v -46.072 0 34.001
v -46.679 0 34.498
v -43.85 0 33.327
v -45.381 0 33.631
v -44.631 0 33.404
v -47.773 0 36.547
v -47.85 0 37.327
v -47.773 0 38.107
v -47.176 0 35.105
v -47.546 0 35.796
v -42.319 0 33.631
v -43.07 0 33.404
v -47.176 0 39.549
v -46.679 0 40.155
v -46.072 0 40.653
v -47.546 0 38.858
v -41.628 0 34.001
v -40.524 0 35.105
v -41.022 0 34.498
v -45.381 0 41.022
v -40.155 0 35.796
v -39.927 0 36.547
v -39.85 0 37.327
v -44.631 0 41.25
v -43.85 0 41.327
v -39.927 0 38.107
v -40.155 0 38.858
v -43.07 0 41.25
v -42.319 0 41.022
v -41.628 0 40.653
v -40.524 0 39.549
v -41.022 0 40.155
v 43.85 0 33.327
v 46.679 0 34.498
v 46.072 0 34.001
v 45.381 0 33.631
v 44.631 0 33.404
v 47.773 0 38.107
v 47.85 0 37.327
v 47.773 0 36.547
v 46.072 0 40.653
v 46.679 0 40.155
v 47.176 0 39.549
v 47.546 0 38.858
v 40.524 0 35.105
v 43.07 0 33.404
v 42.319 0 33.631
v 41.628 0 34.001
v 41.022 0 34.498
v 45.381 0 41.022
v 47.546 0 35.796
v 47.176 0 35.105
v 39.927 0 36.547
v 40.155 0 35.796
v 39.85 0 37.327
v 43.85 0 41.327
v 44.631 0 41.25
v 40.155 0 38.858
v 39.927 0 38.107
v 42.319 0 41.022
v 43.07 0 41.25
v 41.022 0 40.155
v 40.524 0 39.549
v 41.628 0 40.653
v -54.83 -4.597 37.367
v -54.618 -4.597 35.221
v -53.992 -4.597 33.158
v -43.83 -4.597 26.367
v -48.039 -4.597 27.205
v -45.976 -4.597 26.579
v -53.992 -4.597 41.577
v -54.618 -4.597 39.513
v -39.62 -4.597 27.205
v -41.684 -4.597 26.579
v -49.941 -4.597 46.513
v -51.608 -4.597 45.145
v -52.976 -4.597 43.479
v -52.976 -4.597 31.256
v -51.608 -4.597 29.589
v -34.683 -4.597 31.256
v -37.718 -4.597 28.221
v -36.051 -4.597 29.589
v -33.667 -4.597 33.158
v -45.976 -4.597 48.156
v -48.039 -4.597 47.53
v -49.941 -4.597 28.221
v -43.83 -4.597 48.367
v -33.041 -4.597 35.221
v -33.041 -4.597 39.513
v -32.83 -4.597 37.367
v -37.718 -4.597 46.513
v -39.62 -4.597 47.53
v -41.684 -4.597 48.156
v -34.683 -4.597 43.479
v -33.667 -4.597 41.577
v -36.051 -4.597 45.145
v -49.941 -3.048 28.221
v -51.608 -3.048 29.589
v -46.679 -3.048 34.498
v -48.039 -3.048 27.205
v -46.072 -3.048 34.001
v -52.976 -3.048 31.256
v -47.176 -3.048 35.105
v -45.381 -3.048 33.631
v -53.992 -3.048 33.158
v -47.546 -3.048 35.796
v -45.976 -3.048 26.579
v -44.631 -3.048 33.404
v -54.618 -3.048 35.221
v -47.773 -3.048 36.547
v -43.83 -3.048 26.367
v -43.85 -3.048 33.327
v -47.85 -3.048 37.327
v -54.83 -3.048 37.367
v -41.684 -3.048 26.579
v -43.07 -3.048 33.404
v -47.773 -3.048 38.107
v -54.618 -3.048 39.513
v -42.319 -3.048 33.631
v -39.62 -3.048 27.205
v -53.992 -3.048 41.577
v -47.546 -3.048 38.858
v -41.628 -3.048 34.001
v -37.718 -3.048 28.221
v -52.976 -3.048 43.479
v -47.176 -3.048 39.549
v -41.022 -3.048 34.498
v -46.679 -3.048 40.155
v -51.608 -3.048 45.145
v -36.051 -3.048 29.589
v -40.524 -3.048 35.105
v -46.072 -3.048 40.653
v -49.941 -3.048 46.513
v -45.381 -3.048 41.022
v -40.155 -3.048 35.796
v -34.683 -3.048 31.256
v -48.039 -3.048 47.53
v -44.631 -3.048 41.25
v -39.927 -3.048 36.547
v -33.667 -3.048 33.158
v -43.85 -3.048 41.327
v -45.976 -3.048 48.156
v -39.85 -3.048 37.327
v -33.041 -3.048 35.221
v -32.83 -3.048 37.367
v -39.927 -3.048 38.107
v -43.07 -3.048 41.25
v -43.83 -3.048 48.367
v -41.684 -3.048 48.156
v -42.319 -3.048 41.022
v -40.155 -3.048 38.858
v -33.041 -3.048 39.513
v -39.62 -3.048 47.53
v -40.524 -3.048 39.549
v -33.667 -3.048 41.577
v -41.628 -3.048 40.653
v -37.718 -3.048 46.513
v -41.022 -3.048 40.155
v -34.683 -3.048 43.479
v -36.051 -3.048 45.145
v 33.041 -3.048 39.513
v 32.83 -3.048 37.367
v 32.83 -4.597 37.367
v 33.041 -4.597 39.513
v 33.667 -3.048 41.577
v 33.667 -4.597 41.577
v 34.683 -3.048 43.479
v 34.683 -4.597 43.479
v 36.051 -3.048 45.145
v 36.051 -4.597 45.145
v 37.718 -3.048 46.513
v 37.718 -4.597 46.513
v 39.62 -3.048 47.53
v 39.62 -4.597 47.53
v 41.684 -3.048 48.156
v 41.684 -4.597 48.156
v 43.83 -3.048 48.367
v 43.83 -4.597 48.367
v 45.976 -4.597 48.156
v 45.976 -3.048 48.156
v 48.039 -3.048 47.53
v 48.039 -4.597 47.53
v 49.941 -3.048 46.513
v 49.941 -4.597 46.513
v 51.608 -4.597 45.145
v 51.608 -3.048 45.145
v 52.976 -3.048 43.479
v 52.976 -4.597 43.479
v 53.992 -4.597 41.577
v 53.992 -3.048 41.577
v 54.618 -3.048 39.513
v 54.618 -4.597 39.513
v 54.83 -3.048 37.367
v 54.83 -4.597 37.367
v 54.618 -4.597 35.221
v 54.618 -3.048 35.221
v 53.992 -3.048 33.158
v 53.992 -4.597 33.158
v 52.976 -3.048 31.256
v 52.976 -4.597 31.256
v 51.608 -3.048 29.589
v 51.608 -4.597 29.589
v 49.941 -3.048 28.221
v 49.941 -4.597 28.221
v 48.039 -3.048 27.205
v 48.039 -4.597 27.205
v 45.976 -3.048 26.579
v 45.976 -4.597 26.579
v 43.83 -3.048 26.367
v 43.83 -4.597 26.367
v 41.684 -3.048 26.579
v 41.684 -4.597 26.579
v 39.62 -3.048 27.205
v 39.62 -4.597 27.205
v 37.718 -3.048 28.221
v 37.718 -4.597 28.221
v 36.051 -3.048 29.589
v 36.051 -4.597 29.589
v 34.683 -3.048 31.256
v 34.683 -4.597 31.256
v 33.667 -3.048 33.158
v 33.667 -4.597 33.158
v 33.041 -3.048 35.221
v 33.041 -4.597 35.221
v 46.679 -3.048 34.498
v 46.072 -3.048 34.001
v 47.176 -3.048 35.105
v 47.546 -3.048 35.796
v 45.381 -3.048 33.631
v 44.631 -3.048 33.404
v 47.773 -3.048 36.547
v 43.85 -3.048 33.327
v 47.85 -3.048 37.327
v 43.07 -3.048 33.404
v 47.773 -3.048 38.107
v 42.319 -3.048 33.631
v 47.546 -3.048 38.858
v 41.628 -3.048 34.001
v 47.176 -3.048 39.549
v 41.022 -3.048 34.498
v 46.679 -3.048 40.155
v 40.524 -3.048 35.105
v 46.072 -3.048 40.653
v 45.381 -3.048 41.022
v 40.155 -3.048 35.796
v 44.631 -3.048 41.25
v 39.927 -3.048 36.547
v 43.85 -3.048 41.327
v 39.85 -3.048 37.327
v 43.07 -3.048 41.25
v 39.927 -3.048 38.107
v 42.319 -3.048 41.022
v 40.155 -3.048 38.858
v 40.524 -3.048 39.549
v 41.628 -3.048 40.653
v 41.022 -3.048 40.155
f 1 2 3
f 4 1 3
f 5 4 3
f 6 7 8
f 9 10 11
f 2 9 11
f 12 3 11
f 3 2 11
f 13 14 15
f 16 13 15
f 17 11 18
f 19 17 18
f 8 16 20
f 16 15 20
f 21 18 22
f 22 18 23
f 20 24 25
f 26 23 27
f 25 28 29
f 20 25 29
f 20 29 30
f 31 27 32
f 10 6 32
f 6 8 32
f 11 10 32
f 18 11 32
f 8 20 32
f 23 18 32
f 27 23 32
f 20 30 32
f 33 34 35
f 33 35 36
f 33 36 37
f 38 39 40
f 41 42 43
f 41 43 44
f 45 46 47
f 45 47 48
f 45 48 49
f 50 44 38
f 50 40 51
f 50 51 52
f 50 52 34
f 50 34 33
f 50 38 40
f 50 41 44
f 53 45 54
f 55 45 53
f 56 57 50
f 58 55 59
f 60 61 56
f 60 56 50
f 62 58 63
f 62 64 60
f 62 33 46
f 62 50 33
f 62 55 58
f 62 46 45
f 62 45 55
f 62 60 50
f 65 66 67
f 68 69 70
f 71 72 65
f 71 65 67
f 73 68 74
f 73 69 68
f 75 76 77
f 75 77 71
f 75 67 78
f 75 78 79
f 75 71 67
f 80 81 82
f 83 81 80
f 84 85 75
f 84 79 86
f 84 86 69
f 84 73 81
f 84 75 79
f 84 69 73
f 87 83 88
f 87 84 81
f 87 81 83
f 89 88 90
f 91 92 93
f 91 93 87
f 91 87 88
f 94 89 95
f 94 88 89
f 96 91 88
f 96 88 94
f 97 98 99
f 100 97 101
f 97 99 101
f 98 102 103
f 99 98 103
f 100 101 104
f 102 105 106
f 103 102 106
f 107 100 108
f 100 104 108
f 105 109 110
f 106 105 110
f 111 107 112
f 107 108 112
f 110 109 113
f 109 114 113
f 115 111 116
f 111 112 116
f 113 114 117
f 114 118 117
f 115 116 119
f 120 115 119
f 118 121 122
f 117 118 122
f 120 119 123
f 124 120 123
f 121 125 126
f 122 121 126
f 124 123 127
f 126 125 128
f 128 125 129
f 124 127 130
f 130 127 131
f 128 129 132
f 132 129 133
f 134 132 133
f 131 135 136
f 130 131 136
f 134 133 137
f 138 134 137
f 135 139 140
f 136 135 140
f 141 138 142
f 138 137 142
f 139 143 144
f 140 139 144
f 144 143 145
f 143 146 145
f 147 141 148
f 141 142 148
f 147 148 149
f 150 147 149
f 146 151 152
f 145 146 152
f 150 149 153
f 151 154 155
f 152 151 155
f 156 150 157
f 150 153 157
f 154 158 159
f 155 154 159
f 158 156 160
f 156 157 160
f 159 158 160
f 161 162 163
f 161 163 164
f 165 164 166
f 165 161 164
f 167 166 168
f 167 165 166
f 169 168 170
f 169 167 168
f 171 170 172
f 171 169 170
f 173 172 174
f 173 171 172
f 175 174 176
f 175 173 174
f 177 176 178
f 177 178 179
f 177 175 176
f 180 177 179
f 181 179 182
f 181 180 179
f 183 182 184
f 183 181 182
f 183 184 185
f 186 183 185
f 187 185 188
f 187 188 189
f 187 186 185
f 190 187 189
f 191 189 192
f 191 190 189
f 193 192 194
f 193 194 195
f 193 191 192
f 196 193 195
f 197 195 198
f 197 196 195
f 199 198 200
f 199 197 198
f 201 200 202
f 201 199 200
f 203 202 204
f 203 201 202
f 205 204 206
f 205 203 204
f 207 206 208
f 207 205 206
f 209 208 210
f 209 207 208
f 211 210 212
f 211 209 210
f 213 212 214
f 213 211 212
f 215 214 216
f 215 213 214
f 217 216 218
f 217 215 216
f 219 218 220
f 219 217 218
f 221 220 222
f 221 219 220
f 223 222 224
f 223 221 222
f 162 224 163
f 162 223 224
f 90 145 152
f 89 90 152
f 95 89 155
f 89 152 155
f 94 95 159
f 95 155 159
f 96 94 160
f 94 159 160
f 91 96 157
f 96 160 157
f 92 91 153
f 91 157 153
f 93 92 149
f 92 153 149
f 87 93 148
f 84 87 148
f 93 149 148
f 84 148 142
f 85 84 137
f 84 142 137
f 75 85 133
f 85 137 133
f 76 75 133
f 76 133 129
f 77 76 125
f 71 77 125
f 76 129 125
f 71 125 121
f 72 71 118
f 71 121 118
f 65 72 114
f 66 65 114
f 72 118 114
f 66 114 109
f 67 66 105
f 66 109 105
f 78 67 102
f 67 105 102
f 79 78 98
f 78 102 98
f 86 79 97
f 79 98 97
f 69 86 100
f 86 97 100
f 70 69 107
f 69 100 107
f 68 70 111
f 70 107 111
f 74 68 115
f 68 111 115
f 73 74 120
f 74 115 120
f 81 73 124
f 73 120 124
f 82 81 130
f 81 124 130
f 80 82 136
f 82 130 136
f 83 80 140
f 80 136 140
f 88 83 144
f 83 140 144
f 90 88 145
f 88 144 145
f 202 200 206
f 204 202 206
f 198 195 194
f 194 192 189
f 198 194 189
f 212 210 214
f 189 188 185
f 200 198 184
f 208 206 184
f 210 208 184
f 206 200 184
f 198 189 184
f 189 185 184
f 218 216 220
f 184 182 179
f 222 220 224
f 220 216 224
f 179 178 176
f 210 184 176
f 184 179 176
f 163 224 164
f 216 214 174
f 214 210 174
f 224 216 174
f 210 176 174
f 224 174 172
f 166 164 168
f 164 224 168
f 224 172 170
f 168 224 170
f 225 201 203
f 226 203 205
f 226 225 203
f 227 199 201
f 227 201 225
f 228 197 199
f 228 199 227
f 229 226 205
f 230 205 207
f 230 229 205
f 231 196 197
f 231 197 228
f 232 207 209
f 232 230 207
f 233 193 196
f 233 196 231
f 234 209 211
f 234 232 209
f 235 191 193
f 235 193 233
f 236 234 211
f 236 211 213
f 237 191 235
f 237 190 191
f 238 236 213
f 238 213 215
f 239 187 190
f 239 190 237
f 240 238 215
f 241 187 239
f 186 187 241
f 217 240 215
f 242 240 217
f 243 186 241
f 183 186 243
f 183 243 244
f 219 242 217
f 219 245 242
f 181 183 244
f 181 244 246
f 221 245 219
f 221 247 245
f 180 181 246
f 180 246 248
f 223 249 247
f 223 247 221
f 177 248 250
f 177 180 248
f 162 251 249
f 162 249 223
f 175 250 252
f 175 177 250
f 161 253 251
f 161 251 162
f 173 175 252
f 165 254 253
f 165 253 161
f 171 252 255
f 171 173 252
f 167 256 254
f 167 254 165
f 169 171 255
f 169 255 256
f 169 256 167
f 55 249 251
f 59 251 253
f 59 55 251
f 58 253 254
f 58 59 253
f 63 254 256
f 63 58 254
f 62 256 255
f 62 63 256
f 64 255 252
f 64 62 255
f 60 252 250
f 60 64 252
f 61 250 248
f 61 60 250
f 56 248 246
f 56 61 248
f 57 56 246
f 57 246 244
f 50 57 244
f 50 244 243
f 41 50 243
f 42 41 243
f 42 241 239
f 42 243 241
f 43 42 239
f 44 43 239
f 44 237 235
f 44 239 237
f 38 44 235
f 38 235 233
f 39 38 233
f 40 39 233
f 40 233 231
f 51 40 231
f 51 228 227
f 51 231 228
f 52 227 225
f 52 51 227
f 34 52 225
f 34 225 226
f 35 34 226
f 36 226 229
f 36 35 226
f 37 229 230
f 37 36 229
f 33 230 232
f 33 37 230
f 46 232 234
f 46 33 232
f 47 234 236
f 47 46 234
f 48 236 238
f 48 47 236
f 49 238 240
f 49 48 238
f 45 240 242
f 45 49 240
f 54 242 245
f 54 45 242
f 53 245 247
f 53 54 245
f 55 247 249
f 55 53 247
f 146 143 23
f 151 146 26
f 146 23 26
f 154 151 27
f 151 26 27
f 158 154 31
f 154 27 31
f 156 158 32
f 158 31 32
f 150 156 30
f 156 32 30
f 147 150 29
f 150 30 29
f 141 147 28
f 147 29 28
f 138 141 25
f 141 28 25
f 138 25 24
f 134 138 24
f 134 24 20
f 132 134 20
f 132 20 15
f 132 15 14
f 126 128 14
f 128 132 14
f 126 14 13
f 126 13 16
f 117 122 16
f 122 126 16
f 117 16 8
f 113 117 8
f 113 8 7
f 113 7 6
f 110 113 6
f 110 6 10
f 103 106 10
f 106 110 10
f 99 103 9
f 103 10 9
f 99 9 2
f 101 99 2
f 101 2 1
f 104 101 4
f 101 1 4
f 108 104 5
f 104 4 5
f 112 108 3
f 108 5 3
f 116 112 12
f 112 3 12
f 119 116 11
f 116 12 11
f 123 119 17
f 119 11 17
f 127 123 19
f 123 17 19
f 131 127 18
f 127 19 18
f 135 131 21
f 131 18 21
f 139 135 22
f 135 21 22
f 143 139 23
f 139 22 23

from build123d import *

# Parameters (mm, degrees)
F0_R     = 4
F1_DEPTH = 4.064
F4_R     = 11
F5_DEPTH = 1.5494


with BuildPart() as f1:
    # F0 (on Front) → F1 (new body)
    with BuildSketch(Plane.XZ):
        with Locations((-43.850172, 37.326915)):
            Circle(F0_R)
    extrude(amount=F1_DEPTH)

    # F4 (on offset) → F5 (join)
    with BuildSketch(Plane.XZ.offset(3.048)):
        with Locations((-43.829556, 37.367302)):
            Circle(F4_R)
    extrude(amount=F5_DEPTH)


with BuildPart() as f2_1:
    # F2: instance of F1
    add(f1.part.mirror(Plane.YZ))

    # F6: F1 across plane
    add(f1.part.mirror(Plane.YZ))


solid = Compound([f1.part, f2_1.part])
